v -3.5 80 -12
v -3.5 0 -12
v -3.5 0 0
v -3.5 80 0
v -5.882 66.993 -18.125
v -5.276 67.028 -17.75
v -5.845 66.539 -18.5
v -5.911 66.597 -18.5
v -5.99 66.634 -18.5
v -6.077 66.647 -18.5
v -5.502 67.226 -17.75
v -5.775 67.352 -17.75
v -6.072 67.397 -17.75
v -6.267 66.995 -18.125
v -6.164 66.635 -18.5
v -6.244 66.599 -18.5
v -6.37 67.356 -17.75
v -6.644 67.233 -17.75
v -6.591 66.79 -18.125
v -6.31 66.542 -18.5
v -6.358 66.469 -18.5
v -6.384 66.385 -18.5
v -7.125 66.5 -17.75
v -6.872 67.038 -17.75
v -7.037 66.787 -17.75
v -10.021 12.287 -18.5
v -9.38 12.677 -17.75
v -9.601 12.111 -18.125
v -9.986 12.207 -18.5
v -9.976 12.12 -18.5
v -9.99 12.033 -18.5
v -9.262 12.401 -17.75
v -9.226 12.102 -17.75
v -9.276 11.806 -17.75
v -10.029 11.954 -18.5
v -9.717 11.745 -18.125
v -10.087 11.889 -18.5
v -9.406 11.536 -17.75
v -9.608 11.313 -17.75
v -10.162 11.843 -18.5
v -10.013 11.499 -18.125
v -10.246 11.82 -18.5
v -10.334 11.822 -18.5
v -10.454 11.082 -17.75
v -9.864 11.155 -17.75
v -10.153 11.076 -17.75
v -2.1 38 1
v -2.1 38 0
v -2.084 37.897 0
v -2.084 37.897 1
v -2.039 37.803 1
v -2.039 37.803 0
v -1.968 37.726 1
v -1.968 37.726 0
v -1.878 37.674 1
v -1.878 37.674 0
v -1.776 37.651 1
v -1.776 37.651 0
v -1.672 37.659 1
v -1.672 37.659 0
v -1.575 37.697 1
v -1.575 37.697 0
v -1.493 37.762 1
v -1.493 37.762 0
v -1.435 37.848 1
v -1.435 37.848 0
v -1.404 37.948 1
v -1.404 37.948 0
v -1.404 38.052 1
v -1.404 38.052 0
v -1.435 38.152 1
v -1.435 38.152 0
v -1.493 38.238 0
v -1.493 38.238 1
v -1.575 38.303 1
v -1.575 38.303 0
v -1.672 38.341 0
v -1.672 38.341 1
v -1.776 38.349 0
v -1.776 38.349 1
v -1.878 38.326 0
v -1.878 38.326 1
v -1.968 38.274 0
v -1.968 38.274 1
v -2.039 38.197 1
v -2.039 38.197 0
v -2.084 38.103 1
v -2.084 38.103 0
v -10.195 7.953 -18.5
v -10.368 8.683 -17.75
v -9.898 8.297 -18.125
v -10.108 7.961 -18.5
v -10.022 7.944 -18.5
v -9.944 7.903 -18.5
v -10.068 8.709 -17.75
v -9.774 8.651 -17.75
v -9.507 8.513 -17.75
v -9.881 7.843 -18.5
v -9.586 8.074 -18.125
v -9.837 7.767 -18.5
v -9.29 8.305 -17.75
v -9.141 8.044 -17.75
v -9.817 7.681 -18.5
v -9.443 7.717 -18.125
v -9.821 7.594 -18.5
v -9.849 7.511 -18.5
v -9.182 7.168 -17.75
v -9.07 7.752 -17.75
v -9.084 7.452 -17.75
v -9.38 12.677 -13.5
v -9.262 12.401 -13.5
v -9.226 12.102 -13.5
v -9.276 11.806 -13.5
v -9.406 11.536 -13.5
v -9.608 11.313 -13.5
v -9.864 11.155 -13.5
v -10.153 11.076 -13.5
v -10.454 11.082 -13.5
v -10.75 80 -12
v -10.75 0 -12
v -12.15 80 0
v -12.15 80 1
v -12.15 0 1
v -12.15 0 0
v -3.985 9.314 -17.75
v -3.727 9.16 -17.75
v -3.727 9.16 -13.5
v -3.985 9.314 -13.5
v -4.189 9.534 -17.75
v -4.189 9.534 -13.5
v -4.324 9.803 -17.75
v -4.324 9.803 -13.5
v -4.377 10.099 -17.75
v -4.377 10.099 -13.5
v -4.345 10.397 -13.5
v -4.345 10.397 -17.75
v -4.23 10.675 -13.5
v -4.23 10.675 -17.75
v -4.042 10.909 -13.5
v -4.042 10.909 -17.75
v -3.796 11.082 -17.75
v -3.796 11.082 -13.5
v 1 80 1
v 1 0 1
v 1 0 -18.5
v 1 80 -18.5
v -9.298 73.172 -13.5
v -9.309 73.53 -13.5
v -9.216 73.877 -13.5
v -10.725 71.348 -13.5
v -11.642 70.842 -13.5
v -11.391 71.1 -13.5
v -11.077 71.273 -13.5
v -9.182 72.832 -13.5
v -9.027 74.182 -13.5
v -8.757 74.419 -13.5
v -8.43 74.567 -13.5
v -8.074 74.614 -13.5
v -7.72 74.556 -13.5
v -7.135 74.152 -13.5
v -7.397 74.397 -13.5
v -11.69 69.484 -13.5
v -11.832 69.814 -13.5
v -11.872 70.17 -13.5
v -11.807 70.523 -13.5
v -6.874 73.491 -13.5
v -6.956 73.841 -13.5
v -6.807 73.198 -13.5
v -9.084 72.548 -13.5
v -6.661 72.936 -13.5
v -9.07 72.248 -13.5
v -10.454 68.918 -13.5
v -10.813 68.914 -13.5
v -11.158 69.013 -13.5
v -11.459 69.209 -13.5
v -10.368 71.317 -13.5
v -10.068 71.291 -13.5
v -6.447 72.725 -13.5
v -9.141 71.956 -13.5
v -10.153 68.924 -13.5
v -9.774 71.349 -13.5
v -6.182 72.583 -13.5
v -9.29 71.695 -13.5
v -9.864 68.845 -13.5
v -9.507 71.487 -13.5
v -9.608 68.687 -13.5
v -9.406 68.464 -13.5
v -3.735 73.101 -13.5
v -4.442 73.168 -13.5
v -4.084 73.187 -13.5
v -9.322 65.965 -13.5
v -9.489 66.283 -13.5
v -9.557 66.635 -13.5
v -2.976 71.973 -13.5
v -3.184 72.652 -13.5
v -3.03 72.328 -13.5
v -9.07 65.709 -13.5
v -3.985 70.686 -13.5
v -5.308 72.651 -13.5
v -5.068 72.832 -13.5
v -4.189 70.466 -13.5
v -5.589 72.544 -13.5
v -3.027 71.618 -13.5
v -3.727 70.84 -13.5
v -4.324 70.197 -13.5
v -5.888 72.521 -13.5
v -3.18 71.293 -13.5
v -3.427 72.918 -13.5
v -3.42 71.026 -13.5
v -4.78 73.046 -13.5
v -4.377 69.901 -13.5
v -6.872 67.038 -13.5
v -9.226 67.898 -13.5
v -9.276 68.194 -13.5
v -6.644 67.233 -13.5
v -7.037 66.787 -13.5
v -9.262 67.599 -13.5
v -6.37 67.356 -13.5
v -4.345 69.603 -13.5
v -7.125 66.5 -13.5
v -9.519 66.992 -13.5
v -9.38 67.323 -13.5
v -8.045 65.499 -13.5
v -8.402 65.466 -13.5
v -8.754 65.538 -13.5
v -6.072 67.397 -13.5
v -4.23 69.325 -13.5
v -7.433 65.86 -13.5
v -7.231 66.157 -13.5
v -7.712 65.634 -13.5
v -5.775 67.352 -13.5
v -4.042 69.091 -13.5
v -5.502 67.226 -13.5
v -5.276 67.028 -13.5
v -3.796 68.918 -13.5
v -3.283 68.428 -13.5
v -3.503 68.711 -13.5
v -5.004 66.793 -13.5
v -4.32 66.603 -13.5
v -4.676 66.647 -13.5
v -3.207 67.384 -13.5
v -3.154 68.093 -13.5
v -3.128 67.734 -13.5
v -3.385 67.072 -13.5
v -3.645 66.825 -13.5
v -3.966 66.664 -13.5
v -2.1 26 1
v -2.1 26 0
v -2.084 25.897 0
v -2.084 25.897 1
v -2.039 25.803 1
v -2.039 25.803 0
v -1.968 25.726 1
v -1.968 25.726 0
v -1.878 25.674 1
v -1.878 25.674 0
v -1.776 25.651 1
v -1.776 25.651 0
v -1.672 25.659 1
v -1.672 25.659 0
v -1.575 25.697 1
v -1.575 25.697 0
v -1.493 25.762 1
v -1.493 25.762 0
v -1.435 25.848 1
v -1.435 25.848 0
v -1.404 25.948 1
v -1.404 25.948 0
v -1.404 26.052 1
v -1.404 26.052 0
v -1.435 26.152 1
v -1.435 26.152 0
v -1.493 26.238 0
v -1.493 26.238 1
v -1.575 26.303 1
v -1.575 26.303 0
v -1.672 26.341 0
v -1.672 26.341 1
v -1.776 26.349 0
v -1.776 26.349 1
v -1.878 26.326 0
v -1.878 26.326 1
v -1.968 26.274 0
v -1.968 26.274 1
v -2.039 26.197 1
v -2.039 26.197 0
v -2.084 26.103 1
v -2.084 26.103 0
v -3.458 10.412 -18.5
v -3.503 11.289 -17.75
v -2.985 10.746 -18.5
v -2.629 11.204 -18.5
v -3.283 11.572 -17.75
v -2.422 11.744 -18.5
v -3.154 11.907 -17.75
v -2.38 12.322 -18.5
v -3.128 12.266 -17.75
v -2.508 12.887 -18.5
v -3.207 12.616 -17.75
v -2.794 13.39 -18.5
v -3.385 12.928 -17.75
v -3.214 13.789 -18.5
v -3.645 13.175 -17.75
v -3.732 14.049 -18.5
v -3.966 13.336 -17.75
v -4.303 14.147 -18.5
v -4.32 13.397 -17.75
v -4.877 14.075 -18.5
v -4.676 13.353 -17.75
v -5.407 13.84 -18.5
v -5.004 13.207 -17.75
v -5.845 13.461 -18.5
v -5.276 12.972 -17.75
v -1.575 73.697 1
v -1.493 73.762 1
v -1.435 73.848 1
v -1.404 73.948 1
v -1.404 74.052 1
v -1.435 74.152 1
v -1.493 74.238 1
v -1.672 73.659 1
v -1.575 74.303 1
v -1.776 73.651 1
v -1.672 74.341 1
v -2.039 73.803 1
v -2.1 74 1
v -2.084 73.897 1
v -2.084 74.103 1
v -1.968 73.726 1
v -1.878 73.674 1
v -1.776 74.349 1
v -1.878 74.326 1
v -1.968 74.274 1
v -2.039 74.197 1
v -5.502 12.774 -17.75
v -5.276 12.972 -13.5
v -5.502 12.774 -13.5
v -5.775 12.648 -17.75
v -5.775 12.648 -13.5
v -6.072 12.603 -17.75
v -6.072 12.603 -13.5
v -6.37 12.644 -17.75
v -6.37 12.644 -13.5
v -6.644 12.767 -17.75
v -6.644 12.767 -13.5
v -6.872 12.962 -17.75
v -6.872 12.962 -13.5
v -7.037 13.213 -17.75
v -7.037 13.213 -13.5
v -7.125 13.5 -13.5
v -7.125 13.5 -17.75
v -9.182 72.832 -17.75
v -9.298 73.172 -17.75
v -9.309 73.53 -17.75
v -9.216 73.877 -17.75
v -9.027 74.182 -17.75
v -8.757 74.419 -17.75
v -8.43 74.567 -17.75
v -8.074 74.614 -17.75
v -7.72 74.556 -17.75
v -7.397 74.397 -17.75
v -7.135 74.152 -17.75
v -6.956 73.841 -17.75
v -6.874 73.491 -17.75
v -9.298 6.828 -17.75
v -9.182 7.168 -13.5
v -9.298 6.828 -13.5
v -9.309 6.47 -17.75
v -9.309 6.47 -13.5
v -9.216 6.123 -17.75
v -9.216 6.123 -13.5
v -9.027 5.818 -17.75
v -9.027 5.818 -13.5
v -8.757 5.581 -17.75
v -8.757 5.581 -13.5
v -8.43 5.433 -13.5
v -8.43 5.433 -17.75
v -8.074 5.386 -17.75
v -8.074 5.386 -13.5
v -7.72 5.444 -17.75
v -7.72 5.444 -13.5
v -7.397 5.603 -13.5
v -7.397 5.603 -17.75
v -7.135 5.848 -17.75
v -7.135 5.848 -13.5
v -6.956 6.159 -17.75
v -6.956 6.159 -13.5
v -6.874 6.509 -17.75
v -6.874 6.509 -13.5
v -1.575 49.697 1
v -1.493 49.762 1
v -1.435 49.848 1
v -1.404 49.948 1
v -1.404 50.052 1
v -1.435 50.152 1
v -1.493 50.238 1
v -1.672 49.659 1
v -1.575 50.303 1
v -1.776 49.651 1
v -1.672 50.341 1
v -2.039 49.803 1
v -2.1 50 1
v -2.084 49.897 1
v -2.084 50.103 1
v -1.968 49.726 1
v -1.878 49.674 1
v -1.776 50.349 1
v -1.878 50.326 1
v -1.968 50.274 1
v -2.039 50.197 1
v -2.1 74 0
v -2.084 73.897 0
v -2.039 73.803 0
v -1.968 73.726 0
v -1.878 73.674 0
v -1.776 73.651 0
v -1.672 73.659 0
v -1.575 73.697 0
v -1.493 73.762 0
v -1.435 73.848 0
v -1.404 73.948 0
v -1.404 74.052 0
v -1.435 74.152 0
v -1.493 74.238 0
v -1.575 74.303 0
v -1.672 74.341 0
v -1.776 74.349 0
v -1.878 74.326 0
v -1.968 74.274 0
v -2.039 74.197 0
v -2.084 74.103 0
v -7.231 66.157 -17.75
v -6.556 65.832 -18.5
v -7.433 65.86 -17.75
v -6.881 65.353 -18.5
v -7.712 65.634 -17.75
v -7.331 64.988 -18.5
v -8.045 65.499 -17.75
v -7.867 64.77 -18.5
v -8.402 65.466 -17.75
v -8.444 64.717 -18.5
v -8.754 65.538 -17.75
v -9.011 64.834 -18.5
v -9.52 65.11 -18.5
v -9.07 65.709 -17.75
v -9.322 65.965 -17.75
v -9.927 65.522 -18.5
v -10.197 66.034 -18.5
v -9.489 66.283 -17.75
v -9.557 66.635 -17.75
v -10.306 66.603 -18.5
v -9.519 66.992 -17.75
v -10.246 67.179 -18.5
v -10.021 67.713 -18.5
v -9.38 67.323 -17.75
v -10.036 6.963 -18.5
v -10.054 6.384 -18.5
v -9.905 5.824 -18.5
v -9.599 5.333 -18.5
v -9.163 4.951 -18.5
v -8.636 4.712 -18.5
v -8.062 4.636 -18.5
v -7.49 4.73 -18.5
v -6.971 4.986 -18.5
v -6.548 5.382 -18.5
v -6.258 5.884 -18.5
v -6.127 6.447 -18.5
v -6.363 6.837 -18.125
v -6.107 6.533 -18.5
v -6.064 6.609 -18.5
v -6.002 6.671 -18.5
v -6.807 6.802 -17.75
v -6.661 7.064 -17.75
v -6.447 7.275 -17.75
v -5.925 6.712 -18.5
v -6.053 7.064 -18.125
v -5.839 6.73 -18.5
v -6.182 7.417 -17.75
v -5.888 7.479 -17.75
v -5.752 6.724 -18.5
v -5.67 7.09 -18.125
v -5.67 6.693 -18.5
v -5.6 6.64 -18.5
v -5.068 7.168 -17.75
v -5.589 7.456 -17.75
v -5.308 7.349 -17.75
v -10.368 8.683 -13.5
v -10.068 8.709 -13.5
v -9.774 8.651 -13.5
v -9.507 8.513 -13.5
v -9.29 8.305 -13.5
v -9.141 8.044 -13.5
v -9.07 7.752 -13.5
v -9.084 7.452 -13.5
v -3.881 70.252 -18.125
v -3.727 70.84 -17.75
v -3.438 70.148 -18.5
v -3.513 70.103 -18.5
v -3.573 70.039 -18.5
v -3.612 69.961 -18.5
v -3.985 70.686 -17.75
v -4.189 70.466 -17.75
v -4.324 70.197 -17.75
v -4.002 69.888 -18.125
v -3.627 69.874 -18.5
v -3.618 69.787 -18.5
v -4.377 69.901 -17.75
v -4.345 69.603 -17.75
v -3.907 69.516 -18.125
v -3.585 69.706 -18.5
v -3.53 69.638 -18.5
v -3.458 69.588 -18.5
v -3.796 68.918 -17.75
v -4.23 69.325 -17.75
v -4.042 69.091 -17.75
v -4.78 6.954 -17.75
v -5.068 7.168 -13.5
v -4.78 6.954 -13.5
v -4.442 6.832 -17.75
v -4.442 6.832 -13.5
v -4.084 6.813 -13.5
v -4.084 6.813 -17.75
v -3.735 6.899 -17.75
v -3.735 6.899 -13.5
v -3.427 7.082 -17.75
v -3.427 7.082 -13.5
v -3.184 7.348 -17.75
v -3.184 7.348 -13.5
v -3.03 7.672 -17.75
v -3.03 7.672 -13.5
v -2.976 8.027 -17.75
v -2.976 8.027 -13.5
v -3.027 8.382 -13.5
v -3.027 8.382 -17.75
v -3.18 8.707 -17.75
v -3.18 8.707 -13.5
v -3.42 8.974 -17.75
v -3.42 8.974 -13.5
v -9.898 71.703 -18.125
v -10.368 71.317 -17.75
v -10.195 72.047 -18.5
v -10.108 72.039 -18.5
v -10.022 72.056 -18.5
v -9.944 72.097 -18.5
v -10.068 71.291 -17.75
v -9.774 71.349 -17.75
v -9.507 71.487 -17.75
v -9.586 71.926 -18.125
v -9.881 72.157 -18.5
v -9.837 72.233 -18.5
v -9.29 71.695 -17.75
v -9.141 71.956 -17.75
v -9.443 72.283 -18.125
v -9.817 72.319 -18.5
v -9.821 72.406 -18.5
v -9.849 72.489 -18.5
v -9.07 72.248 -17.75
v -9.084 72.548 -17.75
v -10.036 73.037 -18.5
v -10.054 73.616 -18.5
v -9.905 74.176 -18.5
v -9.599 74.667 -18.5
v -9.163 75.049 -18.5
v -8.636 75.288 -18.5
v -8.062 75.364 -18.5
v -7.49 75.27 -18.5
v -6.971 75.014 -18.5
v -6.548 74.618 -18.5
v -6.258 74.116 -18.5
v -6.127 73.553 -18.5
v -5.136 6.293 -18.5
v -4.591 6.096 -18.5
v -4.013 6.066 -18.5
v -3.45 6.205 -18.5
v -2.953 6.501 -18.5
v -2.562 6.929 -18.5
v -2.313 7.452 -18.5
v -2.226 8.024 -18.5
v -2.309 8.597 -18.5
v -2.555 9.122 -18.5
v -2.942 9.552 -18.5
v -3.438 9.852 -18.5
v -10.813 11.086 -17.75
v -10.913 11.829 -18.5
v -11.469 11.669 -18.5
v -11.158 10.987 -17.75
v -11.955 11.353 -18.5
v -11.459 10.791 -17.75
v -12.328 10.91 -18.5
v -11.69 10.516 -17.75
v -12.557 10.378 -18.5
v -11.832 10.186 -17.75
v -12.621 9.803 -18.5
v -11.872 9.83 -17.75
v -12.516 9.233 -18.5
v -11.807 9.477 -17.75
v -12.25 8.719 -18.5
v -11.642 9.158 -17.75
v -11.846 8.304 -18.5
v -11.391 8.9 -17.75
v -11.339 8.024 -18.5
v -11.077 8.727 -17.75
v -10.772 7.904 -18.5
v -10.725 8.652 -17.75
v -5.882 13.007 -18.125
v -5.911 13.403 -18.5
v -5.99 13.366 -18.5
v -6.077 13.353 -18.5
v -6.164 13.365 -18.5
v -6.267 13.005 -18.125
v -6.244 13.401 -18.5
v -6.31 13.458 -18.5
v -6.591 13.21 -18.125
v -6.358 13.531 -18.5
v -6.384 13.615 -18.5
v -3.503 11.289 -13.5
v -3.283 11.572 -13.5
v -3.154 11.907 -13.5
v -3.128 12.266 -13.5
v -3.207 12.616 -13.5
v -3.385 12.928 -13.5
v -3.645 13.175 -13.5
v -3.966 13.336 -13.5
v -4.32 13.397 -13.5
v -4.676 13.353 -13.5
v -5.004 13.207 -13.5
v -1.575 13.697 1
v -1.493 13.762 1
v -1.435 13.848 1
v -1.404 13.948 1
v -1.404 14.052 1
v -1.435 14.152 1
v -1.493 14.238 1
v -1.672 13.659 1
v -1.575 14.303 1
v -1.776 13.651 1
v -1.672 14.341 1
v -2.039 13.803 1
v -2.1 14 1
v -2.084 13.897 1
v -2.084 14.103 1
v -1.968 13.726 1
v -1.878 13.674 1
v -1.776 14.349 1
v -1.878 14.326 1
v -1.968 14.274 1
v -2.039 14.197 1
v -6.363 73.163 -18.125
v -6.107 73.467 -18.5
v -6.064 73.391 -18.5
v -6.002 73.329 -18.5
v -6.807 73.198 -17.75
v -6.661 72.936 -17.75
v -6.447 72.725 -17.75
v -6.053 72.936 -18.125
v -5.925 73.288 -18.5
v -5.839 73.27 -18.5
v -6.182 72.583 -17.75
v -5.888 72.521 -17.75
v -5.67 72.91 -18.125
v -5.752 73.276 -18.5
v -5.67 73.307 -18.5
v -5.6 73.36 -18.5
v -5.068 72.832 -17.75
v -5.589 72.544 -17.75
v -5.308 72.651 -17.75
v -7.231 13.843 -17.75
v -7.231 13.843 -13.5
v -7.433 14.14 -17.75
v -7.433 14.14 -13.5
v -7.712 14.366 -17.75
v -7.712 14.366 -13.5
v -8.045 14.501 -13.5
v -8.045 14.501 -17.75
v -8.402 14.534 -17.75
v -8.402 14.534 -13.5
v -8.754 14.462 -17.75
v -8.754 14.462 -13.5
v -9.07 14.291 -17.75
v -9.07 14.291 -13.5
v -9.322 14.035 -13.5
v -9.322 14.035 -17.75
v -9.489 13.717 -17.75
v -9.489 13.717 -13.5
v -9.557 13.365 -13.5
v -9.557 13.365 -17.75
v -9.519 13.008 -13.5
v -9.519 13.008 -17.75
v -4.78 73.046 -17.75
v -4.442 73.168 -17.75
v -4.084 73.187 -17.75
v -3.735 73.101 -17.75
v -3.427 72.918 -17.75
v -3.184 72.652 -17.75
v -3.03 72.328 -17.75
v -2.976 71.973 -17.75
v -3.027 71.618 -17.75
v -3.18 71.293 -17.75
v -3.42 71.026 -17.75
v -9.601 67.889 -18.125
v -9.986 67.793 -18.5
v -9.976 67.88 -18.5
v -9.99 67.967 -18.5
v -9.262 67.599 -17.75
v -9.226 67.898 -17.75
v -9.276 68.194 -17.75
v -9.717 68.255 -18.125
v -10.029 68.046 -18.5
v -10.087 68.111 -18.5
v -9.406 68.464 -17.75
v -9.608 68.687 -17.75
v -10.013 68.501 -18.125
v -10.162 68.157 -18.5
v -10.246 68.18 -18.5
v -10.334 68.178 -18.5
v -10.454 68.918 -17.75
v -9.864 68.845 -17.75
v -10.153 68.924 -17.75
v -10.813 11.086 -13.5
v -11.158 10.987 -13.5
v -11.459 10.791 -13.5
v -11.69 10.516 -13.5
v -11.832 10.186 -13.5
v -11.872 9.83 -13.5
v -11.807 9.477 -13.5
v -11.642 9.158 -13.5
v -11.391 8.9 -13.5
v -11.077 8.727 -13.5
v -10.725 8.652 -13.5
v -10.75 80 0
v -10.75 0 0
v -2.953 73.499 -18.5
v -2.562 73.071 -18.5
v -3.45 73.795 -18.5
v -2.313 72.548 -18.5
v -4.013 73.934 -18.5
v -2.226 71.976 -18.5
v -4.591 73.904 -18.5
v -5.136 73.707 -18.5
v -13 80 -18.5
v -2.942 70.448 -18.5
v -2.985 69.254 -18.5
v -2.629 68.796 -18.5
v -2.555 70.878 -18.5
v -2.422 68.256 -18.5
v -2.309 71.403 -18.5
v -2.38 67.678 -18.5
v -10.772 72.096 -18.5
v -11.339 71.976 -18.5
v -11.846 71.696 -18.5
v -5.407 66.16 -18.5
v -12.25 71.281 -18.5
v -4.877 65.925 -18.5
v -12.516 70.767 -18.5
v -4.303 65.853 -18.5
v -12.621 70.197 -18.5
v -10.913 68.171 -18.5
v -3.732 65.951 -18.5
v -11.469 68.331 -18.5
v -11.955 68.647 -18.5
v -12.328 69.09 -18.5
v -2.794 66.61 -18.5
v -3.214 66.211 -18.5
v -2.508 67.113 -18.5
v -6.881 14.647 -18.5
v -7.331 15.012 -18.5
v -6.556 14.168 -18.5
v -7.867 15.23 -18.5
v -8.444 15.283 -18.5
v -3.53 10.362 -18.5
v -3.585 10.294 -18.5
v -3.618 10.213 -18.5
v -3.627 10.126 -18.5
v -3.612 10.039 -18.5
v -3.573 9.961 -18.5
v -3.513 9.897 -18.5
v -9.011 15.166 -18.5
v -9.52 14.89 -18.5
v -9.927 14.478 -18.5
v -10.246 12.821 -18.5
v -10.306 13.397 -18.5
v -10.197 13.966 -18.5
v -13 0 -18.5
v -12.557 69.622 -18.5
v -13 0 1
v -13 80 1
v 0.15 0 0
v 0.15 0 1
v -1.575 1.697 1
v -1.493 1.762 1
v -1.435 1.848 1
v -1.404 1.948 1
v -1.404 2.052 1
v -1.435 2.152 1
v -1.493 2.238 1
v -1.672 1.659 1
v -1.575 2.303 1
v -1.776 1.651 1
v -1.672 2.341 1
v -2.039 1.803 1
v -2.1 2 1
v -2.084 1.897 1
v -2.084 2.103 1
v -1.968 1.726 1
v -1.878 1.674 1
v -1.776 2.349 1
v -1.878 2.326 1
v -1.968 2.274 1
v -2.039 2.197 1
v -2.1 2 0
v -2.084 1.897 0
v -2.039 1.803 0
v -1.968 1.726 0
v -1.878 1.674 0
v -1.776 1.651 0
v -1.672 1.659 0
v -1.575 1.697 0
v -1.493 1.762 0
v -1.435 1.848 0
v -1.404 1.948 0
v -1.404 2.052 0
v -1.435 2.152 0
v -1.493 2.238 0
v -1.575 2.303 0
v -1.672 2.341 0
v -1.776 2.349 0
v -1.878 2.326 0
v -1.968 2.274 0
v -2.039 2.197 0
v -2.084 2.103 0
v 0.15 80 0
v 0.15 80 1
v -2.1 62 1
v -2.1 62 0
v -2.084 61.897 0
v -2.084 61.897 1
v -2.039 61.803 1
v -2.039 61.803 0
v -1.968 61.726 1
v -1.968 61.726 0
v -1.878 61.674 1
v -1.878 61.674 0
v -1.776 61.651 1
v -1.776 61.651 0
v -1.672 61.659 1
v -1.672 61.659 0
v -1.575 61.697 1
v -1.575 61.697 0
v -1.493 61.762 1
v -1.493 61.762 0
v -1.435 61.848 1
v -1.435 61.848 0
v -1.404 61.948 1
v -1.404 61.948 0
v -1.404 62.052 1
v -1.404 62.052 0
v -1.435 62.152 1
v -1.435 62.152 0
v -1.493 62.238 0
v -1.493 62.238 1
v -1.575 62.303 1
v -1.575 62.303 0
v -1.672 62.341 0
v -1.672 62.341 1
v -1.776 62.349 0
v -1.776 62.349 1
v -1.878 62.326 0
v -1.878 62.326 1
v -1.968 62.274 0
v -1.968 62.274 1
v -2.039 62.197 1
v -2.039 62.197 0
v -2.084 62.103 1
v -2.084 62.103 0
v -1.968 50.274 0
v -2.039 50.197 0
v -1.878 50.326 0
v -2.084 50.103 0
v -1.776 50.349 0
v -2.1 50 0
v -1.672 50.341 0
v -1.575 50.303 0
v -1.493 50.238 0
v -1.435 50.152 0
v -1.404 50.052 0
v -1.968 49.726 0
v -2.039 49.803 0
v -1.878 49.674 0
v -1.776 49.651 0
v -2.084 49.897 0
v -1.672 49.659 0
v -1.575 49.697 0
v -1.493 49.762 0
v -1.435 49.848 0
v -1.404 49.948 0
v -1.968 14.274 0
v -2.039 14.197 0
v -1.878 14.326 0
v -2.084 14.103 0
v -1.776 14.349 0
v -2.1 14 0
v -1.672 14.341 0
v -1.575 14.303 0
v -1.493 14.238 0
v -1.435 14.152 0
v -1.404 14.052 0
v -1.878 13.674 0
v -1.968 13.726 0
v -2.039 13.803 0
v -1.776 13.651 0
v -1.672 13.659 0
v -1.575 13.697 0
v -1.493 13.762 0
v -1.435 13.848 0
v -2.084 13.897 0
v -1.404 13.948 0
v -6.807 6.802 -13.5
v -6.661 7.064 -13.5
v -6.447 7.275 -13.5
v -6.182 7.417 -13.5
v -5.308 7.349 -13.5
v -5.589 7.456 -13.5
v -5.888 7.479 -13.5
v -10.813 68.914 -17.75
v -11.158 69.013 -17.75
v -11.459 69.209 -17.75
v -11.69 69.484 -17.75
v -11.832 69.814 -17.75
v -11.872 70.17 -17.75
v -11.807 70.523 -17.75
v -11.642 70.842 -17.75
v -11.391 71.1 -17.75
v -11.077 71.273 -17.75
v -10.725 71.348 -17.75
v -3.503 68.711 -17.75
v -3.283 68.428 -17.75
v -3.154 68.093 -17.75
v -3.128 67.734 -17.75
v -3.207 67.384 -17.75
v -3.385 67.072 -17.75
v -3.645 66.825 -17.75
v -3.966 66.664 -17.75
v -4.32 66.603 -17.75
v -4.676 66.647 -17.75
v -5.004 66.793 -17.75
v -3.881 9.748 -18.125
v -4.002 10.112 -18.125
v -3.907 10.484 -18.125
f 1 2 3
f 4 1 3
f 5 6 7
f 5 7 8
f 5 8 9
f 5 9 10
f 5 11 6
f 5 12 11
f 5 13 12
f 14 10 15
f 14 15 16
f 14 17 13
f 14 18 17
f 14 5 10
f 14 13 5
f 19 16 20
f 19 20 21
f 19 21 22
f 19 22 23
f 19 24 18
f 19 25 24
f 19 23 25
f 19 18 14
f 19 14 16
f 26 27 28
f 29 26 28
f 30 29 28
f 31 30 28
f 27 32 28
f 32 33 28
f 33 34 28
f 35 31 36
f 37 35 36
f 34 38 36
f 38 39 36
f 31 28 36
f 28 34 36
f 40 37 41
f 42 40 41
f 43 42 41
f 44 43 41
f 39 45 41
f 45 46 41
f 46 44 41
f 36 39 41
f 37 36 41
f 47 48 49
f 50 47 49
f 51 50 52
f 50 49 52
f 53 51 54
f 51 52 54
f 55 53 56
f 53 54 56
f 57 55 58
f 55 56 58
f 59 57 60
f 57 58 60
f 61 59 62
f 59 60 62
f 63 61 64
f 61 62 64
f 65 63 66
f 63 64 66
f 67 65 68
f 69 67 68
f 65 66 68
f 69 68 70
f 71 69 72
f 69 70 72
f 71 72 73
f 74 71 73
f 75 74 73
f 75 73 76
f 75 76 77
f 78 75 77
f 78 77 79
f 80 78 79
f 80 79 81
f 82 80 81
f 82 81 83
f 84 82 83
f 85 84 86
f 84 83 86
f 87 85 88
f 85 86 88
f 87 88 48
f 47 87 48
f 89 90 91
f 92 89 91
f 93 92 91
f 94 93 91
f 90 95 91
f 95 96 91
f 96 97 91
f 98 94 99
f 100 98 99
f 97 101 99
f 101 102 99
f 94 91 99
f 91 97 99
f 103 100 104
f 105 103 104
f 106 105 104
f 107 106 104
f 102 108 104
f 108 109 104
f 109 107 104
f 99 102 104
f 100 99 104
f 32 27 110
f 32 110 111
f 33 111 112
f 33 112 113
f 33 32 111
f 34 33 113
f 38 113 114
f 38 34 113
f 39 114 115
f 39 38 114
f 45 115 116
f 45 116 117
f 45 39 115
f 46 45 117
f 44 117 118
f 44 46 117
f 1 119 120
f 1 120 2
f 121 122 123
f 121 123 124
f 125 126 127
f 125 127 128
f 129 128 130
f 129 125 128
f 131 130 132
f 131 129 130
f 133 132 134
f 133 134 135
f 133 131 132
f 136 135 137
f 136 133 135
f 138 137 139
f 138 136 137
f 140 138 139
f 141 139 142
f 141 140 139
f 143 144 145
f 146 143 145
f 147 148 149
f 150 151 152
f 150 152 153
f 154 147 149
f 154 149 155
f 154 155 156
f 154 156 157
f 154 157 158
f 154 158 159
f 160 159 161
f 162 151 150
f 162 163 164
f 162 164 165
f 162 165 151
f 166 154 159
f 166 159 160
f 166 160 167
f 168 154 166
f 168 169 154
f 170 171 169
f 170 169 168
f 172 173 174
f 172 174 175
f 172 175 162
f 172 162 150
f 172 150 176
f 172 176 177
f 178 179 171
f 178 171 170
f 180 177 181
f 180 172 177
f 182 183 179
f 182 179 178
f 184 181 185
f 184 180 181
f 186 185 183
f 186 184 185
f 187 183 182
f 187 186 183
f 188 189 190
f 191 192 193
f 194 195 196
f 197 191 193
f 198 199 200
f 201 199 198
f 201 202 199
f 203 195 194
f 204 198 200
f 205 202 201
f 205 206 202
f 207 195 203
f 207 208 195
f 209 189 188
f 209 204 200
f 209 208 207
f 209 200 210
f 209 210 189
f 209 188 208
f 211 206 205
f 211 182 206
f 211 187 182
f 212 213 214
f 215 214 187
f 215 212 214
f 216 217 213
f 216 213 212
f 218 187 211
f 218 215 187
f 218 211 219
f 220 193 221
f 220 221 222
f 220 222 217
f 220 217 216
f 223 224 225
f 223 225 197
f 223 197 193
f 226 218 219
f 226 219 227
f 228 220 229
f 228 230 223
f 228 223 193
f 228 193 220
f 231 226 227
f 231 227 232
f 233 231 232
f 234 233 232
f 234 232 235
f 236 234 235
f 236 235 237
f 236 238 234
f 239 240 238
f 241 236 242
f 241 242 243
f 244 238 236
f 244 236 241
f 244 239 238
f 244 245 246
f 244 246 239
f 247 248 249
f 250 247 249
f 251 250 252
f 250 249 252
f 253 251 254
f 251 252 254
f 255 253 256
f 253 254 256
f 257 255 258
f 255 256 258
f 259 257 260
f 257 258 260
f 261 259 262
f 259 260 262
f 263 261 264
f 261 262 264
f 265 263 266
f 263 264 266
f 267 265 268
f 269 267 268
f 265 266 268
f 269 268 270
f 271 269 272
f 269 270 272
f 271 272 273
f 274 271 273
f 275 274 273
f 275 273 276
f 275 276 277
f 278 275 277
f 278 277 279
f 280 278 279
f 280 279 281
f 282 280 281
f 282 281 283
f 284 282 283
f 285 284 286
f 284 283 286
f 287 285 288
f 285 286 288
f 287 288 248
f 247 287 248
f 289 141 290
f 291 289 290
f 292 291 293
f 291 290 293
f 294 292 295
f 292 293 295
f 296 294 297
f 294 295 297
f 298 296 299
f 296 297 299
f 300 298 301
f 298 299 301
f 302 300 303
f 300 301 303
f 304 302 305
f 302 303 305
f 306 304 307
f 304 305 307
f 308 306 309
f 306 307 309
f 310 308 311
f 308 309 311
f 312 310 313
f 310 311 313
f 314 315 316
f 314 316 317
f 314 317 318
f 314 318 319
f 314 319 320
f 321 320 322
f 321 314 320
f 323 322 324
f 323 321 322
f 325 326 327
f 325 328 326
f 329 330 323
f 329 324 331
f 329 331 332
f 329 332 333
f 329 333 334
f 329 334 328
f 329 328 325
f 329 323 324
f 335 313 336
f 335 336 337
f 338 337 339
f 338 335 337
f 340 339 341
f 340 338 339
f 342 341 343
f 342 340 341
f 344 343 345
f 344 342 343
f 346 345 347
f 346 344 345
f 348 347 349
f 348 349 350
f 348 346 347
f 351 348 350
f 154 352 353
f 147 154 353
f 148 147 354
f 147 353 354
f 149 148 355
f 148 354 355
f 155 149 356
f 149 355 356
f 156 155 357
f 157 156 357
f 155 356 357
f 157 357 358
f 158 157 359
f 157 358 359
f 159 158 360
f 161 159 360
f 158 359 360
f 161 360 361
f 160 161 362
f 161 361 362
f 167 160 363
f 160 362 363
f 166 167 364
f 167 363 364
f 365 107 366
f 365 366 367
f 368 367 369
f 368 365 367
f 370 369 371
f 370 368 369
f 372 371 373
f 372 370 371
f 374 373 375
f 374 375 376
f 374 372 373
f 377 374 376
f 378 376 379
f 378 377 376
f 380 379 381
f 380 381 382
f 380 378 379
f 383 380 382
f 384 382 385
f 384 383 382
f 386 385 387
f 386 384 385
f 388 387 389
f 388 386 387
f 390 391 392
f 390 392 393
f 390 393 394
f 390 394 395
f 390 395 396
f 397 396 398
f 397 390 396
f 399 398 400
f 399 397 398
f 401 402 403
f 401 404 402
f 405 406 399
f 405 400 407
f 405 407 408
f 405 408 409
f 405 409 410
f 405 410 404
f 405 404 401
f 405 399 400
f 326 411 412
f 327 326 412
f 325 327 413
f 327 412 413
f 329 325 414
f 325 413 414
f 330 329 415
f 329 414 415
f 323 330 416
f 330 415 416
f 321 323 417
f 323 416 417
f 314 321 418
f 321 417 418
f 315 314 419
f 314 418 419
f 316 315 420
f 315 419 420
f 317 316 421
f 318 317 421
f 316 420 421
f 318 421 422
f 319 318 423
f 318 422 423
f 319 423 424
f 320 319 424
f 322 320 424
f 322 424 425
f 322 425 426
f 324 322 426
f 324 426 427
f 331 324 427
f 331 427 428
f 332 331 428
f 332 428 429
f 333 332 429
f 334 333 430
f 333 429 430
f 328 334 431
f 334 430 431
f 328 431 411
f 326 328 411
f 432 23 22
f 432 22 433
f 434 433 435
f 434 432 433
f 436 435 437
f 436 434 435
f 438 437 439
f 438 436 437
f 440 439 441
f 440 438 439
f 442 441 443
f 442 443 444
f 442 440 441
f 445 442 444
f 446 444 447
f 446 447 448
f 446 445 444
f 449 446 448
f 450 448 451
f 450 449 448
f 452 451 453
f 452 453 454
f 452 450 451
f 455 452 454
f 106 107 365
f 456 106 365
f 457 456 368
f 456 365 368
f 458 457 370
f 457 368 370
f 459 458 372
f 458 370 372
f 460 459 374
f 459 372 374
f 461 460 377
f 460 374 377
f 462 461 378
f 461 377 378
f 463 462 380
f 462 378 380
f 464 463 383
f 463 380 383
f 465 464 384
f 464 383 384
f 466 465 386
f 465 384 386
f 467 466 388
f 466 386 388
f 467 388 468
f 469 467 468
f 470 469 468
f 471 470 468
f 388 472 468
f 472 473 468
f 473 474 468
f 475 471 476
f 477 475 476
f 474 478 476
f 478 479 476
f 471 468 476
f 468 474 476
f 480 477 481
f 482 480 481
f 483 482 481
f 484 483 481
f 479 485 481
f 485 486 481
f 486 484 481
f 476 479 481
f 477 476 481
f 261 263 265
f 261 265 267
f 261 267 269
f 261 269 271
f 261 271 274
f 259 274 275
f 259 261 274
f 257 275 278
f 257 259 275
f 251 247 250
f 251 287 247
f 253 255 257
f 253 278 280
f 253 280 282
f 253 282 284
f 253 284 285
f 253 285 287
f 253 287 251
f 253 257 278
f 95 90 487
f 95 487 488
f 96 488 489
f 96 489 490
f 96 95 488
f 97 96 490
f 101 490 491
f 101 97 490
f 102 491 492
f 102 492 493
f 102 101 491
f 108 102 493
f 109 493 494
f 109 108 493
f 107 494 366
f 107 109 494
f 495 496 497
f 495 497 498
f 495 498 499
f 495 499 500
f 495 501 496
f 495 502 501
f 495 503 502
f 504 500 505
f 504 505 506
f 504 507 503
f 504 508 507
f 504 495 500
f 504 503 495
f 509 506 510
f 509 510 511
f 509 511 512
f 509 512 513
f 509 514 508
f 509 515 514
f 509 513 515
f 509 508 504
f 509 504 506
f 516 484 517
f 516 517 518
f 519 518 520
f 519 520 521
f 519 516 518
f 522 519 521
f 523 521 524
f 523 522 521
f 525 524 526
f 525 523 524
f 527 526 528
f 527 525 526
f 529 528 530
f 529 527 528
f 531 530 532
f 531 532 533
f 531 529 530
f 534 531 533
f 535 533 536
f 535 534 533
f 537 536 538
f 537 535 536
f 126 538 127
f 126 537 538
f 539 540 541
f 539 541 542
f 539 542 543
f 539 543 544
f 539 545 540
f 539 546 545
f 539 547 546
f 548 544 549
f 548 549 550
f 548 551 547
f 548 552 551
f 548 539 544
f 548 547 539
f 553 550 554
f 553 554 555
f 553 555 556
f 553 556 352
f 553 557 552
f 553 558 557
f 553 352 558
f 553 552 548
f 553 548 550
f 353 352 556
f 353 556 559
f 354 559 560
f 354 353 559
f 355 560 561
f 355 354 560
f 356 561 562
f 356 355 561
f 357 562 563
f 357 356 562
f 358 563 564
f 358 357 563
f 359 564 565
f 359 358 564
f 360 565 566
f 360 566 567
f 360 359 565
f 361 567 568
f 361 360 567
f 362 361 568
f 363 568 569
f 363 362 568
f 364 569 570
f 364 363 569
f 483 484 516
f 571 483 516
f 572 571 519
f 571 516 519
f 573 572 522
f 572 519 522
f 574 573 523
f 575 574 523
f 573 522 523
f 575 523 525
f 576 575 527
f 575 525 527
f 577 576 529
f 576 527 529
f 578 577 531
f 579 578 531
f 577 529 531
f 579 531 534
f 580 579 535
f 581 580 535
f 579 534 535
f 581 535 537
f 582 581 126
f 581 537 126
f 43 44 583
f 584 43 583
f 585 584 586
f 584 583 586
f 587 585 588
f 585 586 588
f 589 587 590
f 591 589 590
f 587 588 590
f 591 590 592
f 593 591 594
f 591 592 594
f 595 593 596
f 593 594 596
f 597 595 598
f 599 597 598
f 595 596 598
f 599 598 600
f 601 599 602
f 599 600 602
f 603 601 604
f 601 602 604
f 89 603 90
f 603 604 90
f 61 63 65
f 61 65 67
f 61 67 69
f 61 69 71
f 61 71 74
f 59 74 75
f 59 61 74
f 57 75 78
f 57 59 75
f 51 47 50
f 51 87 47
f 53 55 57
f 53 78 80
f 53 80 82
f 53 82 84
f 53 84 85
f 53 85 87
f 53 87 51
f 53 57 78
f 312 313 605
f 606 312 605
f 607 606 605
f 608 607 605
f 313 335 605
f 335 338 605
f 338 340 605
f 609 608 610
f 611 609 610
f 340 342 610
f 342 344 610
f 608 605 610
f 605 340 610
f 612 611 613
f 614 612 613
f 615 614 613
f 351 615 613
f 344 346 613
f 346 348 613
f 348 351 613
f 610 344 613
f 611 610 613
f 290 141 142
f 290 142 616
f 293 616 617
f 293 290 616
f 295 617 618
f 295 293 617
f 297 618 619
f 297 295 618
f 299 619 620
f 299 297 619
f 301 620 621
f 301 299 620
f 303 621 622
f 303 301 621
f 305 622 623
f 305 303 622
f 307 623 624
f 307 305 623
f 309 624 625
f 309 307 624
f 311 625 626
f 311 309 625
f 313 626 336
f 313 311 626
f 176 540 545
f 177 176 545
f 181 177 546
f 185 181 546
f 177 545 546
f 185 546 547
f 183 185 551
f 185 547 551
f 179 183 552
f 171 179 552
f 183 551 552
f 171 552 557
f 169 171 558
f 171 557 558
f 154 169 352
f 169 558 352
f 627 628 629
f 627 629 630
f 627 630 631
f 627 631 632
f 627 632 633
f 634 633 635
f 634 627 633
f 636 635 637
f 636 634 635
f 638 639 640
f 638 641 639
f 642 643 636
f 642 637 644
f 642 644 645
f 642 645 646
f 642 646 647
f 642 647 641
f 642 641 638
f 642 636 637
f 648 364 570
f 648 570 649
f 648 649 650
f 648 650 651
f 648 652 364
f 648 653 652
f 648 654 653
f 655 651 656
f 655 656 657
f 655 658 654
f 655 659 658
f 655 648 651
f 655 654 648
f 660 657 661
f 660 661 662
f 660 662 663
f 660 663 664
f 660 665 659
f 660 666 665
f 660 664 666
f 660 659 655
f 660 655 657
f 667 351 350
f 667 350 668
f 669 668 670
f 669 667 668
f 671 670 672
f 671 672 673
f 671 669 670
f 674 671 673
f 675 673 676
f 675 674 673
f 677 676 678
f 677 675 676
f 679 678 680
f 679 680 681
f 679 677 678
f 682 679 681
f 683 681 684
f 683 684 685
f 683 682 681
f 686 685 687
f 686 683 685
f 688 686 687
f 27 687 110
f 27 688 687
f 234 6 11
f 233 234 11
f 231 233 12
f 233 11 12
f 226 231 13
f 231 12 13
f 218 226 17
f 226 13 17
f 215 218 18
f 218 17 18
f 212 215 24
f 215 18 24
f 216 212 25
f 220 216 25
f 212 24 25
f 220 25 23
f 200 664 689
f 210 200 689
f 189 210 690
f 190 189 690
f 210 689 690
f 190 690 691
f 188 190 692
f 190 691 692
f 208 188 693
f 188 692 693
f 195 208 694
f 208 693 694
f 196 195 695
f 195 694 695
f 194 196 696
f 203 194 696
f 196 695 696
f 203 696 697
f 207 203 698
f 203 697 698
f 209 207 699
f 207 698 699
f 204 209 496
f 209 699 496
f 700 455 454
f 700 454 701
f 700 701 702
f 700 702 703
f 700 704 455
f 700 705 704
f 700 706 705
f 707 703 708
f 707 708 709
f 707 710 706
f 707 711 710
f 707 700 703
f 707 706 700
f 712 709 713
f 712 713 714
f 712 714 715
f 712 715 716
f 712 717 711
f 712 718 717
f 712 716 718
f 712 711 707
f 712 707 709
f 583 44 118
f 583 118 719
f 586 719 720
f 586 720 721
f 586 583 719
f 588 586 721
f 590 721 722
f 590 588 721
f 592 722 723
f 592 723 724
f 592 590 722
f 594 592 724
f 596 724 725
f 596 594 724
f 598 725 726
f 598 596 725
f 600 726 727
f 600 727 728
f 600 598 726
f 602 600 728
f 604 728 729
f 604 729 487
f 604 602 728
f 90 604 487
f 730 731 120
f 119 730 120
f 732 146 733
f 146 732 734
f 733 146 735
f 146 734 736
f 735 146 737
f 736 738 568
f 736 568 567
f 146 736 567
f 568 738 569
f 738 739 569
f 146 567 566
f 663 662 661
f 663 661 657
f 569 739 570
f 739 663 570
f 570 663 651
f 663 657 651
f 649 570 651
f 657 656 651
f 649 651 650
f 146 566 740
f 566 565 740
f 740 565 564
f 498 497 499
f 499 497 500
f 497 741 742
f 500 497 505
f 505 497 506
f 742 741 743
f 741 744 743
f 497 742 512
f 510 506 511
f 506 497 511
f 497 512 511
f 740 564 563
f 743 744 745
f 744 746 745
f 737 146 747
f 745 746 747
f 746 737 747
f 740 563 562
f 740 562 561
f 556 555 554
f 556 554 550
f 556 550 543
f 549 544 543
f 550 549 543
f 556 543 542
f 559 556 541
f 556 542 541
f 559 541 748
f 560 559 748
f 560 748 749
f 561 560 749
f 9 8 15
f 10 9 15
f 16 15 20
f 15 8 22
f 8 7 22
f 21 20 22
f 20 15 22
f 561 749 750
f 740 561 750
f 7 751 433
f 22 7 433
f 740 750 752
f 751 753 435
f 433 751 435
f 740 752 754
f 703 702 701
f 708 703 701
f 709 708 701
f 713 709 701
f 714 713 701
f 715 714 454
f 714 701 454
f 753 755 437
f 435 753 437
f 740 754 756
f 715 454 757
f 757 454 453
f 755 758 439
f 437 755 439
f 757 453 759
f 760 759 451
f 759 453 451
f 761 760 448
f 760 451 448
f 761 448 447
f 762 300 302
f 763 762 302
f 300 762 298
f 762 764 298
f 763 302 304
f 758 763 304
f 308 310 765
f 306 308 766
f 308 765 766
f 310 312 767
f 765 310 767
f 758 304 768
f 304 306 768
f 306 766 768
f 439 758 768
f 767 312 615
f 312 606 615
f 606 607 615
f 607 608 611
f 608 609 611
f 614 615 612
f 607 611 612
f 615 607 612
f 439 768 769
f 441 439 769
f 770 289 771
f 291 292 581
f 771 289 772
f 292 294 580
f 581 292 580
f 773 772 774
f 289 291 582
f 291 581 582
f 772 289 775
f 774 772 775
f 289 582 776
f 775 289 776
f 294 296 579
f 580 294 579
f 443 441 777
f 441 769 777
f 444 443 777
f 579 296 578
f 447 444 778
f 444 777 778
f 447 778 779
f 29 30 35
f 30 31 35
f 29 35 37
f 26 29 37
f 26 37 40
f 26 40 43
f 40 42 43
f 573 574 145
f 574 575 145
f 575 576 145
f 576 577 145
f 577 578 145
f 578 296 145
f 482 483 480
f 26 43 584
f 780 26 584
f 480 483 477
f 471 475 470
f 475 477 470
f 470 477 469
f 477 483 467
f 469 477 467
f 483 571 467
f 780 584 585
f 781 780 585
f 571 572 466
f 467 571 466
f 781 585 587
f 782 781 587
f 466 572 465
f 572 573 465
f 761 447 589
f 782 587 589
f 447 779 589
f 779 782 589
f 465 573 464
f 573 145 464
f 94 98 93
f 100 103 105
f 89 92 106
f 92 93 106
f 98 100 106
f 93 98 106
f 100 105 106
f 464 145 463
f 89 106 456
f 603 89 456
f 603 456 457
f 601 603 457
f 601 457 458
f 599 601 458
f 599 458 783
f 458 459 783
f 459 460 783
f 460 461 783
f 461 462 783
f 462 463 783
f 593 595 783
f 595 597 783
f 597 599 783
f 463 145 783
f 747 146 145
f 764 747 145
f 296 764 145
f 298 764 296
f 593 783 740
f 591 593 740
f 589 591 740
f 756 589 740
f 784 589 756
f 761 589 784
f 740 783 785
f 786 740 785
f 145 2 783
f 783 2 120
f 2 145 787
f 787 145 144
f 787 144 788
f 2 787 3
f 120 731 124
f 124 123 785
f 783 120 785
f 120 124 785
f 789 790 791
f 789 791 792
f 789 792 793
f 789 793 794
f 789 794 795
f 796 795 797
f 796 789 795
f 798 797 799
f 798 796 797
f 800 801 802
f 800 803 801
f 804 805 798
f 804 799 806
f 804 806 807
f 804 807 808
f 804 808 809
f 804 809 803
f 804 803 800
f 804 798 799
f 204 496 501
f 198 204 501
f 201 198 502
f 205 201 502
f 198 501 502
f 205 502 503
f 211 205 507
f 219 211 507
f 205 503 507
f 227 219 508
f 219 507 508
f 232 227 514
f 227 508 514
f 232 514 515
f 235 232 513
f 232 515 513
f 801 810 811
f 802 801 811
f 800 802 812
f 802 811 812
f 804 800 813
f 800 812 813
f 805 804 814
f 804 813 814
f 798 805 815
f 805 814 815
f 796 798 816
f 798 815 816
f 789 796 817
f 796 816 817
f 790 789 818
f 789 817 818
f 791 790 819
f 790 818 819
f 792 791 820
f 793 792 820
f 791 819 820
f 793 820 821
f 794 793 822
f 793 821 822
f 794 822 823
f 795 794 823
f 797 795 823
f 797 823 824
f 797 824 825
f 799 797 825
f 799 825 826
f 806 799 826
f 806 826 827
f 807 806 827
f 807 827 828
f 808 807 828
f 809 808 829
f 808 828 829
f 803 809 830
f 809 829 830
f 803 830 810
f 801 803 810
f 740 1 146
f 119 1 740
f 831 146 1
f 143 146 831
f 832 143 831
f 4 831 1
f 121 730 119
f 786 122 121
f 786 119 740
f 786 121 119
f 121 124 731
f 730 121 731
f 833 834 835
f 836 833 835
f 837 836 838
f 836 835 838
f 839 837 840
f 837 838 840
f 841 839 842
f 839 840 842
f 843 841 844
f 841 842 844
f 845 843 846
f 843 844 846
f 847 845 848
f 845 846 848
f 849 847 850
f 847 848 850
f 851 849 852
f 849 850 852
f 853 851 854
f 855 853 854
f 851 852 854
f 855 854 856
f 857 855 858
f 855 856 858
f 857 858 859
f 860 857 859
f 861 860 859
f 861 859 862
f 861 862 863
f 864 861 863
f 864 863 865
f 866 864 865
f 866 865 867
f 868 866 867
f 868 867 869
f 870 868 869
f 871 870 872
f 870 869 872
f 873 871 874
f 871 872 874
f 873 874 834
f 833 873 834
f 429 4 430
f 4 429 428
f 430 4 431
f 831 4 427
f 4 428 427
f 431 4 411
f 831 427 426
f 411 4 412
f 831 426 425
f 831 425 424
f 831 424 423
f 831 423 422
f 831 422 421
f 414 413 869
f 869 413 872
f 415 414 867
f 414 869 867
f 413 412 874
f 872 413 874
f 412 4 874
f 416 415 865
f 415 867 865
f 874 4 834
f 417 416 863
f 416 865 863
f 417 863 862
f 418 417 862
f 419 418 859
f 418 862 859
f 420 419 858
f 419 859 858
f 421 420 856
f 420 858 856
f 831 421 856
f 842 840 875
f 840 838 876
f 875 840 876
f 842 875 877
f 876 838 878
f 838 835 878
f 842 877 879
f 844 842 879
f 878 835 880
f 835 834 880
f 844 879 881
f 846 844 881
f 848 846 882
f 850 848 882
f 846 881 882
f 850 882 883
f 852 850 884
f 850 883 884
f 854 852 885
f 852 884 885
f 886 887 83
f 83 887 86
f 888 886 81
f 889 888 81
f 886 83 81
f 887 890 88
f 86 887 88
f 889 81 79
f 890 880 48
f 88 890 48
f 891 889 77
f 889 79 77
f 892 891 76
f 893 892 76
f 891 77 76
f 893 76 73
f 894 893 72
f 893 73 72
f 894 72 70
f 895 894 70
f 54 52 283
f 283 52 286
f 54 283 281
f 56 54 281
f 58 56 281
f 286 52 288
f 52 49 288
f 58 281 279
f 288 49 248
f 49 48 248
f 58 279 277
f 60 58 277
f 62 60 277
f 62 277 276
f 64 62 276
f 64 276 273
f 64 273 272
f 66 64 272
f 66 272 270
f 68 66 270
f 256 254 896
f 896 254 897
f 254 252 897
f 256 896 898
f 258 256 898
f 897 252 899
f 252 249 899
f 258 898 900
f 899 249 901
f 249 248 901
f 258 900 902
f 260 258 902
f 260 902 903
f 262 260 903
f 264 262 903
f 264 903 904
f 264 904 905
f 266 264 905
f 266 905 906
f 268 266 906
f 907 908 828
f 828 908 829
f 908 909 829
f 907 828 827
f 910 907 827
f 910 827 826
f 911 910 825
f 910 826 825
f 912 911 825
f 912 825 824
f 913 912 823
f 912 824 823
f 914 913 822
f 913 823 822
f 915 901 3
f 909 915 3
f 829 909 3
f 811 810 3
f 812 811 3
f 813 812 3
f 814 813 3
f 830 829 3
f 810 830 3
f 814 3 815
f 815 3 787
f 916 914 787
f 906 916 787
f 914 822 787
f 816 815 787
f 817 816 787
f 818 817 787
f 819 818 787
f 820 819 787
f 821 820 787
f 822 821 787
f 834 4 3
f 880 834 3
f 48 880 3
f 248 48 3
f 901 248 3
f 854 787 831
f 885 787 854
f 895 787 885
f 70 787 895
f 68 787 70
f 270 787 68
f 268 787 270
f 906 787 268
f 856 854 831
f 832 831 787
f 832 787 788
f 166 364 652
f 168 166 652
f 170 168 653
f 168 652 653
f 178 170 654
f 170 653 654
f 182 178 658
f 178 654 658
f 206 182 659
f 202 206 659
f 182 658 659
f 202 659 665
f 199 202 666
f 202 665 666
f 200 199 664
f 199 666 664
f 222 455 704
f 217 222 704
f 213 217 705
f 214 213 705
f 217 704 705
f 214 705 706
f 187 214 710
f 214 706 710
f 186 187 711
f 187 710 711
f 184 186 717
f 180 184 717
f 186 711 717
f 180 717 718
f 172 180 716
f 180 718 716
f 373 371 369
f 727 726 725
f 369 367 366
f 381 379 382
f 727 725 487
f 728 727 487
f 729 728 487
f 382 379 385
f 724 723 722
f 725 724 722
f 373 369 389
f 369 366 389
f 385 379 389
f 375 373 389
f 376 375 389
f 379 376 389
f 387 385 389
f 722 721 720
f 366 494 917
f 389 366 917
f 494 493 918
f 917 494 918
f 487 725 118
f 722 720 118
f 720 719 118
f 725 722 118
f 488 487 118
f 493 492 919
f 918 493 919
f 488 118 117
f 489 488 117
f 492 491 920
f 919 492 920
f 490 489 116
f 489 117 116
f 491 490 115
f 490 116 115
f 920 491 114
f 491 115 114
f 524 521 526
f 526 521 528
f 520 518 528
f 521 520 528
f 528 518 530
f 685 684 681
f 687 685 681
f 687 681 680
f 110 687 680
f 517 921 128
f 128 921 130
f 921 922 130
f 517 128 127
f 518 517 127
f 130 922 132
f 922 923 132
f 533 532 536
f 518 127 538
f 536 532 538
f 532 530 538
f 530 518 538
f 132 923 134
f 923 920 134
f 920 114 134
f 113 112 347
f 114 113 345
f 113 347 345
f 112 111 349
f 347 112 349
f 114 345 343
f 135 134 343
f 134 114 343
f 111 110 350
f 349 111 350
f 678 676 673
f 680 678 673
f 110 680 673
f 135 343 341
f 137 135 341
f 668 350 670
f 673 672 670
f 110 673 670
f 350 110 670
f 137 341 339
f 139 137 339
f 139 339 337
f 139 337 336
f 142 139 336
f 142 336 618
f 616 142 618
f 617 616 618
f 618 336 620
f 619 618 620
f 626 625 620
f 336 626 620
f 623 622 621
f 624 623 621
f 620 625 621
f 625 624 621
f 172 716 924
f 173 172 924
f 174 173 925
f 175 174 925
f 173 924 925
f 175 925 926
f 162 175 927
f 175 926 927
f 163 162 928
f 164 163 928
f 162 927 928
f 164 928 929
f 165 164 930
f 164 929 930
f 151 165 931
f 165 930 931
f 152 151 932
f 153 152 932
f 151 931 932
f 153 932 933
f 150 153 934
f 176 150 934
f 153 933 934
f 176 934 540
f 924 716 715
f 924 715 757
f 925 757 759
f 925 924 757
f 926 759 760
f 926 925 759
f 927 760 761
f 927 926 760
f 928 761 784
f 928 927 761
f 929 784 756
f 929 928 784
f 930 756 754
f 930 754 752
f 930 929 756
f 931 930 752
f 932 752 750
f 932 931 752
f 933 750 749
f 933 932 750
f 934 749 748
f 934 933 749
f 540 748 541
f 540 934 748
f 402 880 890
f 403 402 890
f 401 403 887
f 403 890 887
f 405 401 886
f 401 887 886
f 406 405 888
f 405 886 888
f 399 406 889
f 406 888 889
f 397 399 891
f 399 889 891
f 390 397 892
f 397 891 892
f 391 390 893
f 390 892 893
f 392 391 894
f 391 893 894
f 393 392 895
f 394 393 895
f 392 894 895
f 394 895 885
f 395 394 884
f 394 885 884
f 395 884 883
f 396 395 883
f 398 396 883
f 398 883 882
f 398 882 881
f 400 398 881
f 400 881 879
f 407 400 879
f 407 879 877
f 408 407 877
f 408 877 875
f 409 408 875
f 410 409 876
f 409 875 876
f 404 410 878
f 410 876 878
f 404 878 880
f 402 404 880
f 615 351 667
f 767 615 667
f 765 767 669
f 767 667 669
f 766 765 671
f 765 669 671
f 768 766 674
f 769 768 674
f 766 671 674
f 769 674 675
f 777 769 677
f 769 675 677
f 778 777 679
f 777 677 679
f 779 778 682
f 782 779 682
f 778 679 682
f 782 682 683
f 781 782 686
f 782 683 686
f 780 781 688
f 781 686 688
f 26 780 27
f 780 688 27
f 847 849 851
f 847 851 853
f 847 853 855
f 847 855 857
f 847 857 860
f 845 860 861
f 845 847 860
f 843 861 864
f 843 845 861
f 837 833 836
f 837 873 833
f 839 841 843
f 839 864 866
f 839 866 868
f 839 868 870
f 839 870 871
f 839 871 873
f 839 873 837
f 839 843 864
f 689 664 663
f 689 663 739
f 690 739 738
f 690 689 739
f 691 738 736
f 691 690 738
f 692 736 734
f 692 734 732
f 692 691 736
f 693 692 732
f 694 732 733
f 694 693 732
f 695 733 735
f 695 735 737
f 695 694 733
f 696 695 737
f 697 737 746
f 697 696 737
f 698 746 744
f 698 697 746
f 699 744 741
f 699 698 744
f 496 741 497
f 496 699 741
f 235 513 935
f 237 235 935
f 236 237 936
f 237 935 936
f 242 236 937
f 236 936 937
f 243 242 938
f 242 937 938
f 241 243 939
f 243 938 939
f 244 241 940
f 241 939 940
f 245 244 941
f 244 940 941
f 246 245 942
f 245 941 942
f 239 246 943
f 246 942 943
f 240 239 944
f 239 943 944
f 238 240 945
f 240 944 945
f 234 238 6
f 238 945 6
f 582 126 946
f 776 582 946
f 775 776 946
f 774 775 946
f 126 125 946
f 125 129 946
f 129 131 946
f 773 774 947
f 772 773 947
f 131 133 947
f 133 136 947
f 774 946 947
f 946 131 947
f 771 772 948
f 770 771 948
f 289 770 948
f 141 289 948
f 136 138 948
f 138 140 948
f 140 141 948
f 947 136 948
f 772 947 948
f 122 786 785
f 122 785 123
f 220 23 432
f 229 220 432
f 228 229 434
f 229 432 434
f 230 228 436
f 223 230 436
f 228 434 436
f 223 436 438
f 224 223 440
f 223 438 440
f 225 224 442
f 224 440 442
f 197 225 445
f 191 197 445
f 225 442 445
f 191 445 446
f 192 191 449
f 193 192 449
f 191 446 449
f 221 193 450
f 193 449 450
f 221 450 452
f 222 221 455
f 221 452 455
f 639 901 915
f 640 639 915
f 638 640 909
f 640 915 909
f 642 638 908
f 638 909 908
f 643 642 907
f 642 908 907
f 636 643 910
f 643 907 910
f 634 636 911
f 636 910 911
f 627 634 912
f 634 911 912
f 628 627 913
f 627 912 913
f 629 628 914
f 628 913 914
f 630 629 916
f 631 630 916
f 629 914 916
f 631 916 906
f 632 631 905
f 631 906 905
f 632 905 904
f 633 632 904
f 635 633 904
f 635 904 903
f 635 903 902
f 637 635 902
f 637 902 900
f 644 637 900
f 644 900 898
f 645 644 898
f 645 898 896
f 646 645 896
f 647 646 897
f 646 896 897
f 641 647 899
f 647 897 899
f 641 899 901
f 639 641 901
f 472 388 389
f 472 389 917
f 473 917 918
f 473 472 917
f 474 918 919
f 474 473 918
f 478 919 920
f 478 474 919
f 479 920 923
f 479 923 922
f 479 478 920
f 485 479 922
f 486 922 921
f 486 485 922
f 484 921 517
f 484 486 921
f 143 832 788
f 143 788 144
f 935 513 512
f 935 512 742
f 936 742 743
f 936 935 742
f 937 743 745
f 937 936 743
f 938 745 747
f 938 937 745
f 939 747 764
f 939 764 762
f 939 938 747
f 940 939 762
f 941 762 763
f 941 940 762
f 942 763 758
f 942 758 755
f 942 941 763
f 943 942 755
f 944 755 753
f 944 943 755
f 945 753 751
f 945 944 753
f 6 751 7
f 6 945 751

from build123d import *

# Parameters (mm, degrees)
PROFILE_EXTRUDE_DEPTH                = 80
SPROCKET_SKETCH_R                    = 0.35
SPROCKET_EXTRUDE_DEPTH               = 1
SPROCKET_PATTERN_COUNT               = 7
SPROCKET_PATTERN_PITCH               = 12
MAGNET_START                         = -6.5
MAGNET_CUT_DEPTH                     = 5
MAGNET_CHAMFER_SIZE                  = 0.75
MAGNET_CHAMFER_OF_MAGNET_MIRROR_SIZE = 0.75


with BuildPart() as part:
    # Profile Sketch → Profile Extrude (new body)
    with BuildSketch(Plane(origin=(0.045617437, 0, -0.024209872), x_dir=(-1, 0, 0), z_dir=(0, 1, 0))):
        Polygon((3.545617437, -11.975790128), (3.545617437, 0.024209872), (-0.104382563, 0.024209872), (-0.104382563, 1.024209872), (-0.954382563, 1.024209872), (-0.954382563, -18.475790128), (13.045617437, -18.475790128), (13.045617437, 1.024209872), (12.195617437, 1.024209872), (12.195617437, 0.024209872), (10.795617437, 0.024209872), (10.795617437, -11.975790128), align=None)
    extrude(amount=PROFILE_EXTRUDE_DEPTH)

    # Sprocket Sketch → Sprocket Extrude (add)
    with BuildSketch(Plane.XY):
        with Locations(Location((-1.75, 2, 0), (0, 0, 180))):
            Circle(SPROCKET_SKETCH_R)
    sprocket_extrude = extrude(amount=SPROCKET_EXTRUDE_DEPTH)

    # Sprocket Pattern: Sprocket Extrude ×7
    with Locations(*[(0, i * SPROCKET_PATTERN_PITCH, 0) for i in range(1, SPROCKET_PATTERN_COUNT)]):
        add(sprocket_extrude)

    # Magnet Hole Sketch → Magnet Cut (cut)
    with BuildSketch(Plane.XY.offset(-12).offset(MAGNET_START)):
        with BuildLine():
            ThreePointArc((-5.276039281, 12.971757773), (-6.369559557, 12.644203044), (-7.125, 13.5))
            ThreePointArc((-7.125, 13.5), (-8.753920776, 14.461963369), (-9.379949311, 12.676789795))
            ThreePointArc((-9.379949311, 12.676789795), (-9.4063426, 11.535570233), (-10.453697807, 11.08155948))
            ThreePointArc((-10.453697807, 11.08155948), (-11.87194354, 9.829626791), (-10.367596036, 8.682589301))
            ThreePointArc((-10.367596036, 8.682589301), (-9.29038771, 8.304831552), (-9.182248383, 7.16844052))
            ThreePointArc((-9.182248383, 7.16844052), (-8.429851675, 5.432740197), (-6.874085251, 6.509005616))
            ThreePointArc((-6.874085251, 6.509005616), (-6.181940604, 7.41675805), (-5.067751617, 7.16844052))
            ThreePointArc((-5.067751617, 7.16844052), (-3.184499145, 7.347651415), (-3.727330121, 9.159857515))
            ThreePointArc((-3.727330121, 9.159857515), (-4.37676953, 10.098637121), (-3.796302193, 11.08155948))
            ThreePointArc((-3.796302193, 11.08155948), (-3.384784865, 12.928018228), (-5.276039281, 12.971757773))
        make_face()
    magnet_cut = extrude(amount=MAGNET_CUT_DEPTH, mode=Mode.SUBTRACT)

    # Magnet Chamfer
    magnet_chamfer_edges = [part.edges().sort_by_distance(p)[0] for p in [
        (-3.384784865, 12.928018228, -18.5),
        (-8.753920776, 14.461963369, -18.5),
        (-11.87194354, 9.829626791, -18.5),
        (-8.429851675, 5.432740197, -18.5),
        (-3.184499145, 7.347651415, -18.5),
        (-4.37676953, 10.098637121, -18.5),
        (-6.181940604, 7.41675805, -18.5),
        (-9.29038771, 8.304831552, -18.5),
        (-9.4063426, 11.535570233, -18.5),
        (-6.369559557, 12.644203044, -18.5),
    ]]
    chamfer(magnet_chamfer_edges, length=MAGNET_CHAMFER_SIZE)

    # Magnet Mirror: Magnet Cut across plane
    add(magnet_cut.mirror(Plane(origin=(0, 40, 0), x_dir=(0, 0, 1), z_dir=(0, -1, 0))), mode=Mode.SUBTRACT)

    # Magnet Chamfer of Magnet Mirror
    magnet_chamfer_of_magnet_mirror_edges = [part.edges().sort_by_distance(p)[0] for p in [
        (-3.384784865, 67.071981772, -18.5),
        (-8.753920776, 65.538036631, -18.5),
        (-11.87194354, 70.170373209, -18.5),
        (-8.429851675, 74.567259803, -18.5),
        (-3.184499145, 72.652348585, -18.5),
        (-4.37676953, 69.901362879, -18.5),
        (-6.181940604, 72.58324195, -18.5),
        (-9.29038771, 71.695168448, -18.5),
        (-9.4063426, 68.464429767, -18.5),
        (-6.369559557, 67.355796956, -18.5),
    ]]
    chamfer(magnet_chamfer_of_magnet_mirror_edges, length=MAGNET_CHAMFER_OF_MAGNET_MIRROR_SIZE)


solid = part.part
